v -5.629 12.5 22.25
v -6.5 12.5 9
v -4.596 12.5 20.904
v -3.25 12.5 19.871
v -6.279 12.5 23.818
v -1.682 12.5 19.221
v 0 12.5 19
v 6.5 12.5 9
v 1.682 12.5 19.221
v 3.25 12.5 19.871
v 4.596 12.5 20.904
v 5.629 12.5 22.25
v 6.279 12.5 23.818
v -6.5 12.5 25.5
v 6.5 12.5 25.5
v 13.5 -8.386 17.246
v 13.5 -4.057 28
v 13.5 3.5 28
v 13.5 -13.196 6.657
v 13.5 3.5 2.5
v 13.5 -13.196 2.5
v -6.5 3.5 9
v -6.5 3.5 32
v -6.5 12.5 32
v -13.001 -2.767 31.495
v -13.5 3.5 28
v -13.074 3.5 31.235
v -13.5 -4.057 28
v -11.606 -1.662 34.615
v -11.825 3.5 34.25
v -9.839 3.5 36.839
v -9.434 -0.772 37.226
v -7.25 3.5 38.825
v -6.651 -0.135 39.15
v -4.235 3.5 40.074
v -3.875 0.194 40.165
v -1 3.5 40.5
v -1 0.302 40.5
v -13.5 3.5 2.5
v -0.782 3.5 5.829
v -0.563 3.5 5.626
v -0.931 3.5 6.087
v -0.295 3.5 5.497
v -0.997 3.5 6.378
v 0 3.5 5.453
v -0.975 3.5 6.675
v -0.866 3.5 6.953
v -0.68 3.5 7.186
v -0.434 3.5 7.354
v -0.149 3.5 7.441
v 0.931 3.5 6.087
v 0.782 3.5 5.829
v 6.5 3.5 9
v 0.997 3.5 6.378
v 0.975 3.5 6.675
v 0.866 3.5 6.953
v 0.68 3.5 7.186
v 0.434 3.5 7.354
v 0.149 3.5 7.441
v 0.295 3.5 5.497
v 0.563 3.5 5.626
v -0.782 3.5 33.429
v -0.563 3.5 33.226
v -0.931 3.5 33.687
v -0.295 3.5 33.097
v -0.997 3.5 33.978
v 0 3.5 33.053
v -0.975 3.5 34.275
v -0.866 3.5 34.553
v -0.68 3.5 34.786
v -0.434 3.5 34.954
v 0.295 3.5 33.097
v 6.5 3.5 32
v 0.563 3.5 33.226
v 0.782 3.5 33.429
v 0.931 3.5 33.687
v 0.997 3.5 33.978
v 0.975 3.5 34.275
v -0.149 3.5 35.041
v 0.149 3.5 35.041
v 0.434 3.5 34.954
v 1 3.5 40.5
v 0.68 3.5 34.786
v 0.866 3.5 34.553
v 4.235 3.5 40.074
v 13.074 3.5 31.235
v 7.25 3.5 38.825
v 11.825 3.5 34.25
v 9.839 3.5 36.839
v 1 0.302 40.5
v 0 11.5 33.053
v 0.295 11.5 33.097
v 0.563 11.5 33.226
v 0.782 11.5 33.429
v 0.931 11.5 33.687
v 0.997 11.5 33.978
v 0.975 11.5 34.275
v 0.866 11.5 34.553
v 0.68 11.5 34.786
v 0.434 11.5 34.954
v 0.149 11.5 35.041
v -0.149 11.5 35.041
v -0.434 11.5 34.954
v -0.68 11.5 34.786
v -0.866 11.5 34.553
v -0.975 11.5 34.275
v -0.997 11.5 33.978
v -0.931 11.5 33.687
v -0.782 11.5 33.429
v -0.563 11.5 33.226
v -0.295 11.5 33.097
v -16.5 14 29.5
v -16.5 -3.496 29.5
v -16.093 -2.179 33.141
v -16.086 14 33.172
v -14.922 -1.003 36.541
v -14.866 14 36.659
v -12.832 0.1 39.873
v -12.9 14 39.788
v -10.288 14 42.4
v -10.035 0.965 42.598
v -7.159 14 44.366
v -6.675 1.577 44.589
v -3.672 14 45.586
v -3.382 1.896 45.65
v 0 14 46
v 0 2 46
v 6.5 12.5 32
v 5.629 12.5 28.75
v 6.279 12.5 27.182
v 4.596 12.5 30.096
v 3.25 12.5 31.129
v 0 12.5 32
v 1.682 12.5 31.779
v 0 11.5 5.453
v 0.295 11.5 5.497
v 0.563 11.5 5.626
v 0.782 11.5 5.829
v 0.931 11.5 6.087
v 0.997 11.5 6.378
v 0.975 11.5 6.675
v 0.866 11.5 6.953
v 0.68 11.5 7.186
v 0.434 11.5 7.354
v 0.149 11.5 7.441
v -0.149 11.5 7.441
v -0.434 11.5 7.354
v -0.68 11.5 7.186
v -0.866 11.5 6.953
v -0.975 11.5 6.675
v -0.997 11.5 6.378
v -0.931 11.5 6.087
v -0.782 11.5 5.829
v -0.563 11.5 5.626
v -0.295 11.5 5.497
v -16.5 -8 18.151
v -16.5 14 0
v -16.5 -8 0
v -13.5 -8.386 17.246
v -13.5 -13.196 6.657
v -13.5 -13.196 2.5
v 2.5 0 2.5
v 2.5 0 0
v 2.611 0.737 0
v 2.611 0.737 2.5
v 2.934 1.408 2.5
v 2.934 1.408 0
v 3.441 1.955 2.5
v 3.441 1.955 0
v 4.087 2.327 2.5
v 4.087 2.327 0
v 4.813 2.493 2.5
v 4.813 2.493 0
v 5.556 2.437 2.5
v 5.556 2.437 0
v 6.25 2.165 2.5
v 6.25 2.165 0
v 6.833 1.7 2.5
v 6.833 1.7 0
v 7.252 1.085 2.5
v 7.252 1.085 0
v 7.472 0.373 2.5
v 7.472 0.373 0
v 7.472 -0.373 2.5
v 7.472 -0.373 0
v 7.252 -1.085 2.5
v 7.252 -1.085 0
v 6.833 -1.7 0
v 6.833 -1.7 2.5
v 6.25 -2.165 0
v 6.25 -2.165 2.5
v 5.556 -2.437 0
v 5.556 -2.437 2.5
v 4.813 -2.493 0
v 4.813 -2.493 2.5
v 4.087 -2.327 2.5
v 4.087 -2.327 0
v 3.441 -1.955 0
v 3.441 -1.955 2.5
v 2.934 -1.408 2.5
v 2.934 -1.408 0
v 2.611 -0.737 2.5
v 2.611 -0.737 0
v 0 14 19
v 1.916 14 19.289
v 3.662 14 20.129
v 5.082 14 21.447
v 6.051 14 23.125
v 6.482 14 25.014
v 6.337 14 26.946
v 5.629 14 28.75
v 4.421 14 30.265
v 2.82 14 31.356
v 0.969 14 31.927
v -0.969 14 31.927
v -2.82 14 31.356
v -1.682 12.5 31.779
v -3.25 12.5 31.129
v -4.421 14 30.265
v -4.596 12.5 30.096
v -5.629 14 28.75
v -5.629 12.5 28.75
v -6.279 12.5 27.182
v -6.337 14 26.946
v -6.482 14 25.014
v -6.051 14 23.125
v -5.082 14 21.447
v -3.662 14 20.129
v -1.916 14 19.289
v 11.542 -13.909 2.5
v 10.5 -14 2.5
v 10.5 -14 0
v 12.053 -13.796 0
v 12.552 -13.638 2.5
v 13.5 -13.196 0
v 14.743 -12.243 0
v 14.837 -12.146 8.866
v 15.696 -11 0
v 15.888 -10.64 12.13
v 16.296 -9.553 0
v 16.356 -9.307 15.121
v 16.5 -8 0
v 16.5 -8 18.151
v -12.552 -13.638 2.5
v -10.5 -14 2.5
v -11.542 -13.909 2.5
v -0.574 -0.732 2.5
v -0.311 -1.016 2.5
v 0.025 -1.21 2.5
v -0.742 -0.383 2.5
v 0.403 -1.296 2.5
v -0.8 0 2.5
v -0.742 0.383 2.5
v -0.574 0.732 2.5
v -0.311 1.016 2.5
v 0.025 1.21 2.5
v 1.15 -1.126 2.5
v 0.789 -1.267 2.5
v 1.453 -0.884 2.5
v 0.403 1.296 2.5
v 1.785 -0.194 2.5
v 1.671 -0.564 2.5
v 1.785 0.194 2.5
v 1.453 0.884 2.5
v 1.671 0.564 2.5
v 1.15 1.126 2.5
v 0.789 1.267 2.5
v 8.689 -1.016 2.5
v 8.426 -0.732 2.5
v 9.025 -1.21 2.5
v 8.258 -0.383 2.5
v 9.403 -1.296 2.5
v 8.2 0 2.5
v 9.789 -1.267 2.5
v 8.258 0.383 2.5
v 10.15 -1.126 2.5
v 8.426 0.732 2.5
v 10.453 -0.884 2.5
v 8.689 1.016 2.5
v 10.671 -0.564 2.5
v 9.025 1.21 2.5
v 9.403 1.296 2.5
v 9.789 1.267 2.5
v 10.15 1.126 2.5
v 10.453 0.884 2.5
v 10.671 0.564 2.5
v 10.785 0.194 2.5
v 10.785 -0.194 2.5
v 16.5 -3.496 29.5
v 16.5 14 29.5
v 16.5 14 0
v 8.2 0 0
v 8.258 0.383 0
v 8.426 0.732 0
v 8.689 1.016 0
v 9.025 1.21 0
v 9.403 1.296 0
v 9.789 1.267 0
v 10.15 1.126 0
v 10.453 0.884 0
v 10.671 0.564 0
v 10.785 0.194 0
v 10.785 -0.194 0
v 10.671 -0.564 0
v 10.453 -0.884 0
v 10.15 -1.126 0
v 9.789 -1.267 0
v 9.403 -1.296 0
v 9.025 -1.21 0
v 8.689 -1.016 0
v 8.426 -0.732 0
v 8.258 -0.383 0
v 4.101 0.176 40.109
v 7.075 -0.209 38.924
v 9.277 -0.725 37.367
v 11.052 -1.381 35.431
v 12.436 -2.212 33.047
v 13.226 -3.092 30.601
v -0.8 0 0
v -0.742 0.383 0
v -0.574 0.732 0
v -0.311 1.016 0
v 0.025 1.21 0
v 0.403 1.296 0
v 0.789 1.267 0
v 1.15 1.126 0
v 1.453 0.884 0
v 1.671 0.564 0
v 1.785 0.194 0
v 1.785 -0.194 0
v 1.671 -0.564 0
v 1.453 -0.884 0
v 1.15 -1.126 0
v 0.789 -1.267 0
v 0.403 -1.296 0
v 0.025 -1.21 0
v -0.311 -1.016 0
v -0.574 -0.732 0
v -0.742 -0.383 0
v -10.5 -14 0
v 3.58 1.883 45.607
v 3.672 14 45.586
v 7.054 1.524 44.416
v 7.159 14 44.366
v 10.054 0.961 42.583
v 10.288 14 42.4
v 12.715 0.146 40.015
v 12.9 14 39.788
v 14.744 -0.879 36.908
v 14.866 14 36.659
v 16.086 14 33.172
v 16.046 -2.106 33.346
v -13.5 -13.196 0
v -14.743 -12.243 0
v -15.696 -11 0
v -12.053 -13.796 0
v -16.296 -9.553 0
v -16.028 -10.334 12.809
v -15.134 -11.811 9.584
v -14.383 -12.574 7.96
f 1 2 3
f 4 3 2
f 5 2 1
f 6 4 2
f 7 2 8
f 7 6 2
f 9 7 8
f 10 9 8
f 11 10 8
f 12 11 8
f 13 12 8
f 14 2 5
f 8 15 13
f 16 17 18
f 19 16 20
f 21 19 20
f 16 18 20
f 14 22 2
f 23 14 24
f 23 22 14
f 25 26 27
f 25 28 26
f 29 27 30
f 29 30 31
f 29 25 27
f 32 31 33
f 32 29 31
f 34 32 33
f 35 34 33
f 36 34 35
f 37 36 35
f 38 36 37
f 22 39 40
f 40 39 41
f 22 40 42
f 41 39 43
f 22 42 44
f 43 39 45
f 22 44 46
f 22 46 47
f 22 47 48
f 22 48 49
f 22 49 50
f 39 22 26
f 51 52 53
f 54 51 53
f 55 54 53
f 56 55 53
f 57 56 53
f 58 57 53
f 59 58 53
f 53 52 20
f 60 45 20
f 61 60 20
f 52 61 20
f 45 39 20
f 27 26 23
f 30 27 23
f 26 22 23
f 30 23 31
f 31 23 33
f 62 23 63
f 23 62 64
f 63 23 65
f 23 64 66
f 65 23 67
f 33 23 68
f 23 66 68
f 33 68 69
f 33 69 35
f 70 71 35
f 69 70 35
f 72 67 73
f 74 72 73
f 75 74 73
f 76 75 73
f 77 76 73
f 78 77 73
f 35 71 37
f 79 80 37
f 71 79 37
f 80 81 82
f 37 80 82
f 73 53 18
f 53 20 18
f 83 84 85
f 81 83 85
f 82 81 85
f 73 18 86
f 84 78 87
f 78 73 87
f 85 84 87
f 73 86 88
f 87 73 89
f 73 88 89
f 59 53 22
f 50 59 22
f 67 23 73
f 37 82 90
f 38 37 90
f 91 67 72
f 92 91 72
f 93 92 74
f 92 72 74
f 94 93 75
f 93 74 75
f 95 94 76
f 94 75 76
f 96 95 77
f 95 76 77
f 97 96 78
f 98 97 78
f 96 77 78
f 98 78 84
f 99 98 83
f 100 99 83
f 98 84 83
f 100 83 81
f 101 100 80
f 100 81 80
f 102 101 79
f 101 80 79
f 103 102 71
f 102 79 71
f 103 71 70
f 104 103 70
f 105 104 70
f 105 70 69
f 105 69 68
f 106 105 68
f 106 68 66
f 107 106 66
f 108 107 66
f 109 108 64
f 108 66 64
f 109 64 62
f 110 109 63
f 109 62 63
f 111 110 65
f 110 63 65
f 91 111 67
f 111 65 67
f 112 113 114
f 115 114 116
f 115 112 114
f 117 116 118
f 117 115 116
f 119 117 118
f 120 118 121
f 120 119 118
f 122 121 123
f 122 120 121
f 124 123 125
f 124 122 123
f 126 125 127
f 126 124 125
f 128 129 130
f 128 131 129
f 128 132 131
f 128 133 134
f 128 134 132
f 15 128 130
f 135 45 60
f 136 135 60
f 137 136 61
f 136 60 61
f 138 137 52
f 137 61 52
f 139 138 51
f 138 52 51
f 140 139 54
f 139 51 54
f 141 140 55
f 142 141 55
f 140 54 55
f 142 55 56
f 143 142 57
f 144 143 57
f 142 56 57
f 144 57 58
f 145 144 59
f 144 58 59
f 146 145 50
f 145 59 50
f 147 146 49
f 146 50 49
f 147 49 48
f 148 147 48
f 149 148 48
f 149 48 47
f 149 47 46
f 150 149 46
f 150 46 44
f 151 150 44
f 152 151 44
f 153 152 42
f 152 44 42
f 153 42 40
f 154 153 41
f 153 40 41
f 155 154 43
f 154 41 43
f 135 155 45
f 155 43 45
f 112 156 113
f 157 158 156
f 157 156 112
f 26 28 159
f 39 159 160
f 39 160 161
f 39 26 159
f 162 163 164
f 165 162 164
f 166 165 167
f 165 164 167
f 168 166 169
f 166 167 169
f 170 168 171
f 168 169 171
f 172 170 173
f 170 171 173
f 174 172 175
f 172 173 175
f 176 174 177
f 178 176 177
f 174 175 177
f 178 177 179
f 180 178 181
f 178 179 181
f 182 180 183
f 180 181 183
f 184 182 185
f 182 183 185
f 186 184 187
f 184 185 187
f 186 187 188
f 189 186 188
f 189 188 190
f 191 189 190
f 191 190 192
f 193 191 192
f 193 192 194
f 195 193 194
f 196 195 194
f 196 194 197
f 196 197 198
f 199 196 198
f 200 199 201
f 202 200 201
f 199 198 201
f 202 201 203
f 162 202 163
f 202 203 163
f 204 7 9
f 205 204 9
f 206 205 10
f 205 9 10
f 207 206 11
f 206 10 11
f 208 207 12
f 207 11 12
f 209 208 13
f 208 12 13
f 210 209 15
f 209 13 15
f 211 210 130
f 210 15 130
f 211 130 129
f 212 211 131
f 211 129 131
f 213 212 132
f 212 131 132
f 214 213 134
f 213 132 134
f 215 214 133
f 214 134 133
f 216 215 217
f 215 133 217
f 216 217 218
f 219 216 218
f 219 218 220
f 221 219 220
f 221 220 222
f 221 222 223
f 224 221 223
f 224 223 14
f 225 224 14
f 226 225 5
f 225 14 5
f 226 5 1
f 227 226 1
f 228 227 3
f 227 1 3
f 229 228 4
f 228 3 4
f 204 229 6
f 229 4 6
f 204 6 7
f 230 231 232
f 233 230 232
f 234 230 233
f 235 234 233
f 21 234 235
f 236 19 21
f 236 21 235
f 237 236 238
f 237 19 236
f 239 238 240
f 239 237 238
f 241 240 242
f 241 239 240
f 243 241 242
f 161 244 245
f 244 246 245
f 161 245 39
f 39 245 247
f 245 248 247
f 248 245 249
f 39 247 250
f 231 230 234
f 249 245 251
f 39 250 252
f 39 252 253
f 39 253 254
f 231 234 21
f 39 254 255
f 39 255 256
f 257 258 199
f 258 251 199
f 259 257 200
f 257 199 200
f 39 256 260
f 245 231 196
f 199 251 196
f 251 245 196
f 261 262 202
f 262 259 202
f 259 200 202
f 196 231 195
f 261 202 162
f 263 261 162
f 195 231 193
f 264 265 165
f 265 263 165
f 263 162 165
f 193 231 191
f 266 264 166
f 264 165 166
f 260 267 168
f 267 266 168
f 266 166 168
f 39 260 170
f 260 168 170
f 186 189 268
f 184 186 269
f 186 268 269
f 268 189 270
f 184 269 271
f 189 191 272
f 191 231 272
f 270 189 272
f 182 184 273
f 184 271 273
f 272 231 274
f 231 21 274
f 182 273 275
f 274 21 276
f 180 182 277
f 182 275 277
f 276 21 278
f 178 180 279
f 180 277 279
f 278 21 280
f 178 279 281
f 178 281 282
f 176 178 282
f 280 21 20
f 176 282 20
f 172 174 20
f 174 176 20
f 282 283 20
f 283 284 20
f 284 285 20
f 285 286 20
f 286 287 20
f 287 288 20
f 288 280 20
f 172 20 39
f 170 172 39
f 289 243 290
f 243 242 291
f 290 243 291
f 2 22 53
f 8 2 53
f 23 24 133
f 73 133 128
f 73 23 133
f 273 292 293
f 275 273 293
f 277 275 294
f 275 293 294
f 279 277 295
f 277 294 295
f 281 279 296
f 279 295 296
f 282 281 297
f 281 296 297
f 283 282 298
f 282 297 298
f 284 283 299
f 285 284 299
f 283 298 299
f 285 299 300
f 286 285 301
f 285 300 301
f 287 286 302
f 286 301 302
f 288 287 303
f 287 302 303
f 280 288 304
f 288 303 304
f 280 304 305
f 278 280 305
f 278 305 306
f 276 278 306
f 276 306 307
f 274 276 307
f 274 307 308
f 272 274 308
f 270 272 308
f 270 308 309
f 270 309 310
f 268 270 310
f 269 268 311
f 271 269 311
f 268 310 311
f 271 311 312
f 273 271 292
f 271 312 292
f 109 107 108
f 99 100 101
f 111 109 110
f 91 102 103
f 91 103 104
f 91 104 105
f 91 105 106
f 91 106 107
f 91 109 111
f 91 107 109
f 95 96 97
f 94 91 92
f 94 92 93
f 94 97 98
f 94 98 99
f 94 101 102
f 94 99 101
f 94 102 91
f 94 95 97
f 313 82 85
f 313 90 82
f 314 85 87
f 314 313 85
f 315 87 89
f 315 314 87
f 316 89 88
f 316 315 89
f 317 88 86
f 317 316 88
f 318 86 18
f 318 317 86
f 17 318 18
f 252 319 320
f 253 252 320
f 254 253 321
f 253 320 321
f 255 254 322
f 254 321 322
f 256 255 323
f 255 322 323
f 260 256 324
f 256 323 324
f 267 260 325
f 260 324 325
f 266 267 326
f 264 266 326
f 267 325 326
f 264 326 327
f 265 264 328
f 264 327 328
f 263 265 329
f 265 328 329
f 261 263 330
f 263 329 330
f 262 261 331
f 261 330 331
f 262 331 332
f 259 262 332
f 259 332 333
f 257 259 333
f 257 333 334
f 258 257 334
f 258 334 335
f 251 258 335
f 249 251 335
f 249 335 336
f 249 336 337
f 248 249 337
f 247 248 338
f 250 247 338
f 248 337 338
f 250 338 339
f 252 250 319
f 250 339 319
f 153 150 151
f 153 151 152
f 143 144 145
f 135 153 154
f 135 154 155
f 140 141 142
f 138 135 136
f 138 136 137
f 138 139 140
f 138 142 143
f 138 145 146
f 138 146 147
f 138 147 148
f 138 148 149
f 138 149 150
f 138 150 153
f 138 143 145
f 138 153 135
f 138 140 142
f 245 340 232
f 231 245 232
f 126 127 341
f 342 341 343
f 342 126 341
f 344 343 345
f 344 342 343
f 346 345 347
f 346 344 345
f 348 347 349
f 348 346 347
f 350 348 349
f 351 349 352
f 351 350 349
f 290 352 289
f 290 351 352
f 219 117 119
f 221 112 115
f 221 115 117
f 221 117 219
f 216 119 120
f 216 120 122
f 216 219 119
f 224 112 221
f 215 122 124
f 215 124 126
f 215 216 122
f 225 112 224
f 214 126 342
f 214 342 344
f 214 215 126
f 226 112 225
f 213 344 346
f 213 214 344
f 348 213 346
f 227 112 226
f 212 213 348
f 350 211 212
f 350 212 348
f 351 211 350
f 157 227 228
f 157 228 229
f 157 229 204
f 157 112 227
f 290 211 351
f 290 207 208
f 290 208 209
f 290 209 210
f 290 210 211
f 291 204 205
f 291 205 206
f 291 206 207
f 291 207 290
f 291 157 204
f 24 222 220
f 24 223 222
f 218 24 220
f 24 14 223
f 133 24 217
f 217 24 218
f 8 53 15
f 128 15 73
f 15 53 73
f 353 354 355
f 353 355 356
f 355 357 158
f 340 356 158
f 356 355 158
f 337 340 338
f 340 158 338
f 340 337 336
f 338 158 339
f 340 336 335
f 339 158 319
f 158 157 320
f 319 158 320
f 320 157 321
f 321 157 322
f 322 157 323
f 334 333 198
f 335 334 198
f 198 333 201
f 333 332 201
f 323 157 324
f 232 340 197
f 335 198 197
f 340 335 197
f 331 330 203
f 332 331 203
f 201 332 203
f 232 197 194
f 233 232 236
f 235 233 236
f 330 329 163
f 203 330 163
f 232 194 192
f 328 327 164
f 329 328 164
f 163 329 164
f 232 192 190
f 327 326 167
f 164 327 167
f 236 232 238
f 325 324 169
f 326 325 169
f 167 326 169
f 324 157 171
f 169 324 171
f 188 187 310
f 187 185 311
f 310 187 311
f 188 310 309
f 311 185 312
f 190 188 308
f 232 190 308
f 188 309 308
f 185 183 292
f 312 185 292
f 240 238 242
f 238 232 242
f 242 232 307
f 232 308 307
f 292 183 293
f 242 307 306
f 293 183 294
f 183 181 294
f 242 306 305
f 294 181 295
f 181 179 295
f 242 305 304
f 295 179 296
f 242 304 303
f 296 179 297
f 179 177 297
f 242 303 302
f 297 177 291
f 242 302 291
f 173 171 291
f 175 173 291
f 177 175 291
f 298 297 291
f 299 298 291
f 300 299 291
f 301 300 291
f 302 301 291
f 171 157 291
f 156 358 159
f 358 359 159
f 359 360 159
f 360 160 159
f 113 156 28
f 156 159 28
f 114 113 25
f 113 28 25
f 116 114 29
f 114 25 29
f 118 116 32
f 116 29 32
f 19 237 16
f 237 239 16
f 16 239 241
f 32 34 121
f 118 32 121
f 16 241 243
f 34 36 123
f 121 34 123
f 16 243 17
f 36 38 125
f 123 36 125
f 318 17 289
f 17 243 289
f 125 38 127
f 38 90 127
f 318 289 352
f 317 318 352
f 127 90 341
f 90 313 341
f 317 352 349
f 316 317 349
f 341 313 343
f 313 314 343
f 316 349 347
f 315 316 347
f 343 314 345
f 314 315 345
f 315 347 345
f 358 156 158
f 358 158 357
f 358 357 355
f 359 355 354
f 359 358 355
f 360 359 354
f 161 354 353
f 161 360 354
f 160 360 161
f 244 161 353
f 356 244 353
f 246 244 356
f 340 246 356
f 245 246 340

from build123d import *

# Parameters (mm, degrees)
SKETCH1_W           = 33
SKETCH1_H           = 28
BOSS_EXTRUDE1_DEPTH = 46
CUT_EXTRUDE1_DEPTH  = 59.318093247
CUT_EXTRUDE2_START  = -3
CUT_EXTRUDE2_DEPTH  = 27
FILLET2_R           = 12.5
FILLET3_R           = 16.5
FILLET4_R           = 6
SKETCH5_W           = 13
SKETCH5_H           = 23
CUT_EXTRUDE3_DEPTH  = 9
SKETCH6_R           = 6.5
CUT_EXTRUDE4_DEPTH  = 56.592265809
SKETCH7_R           = 1
CUT_EXTRUDE6_DEPTH  = 8
SKETCH8_R           = 1.3
SKETCH8_R_2         = 2.5
CUT_EXTRUDE7_DEPTH  = 2.5


with BuildPart() as part:
    # Sketch1 → Boss-Extrude1 (new body)
    with BuildSketch(Plane.XY):
        Rectangle(SKETCH1_W, SKETCH1_H)
    extrude(amount=BOSS_EXTRUDE1_DEPTH)

    # Sketch2 → Cut-Extrude1 (cut, through all)
    with BuildSketch(Plane(origin=(16.5, 0, 0), x_dir=(0, 0, -1), z_dir=(1, 0, 0))):
        with BuildLine():
            Line((-46, 2), (-46, -14))
            Line((-46, -14), (-5, -14))
            add(Edge.make_bspline(
                [(-5, -14), (-24.903930892, -4.26145895), (-46, 2)],
                knots=[0, 0, 0, 1, 1, 1], degree=2))
        make_face()
    extrude(amount=-CUT_EXTRUDE1_DEPTH, mode=Mode.SUBTRACT)

    # Sketch4 → Cut-Extrude2 (cut)
    with BuildSketch(Plane(origin=(16.5, 0, 0), x_dir=(0, 0, -1), z_dir=(1, 0, 0)).offset(CUT_EXTRUDE2_START)):
        with BuildLine():
            Line((-5, -14), (-2.5, -14))
            Line((-2.5, -14), (-2.5, 3.5))
            Line((-2.5, 3.5), (-40.5, 3.5))
            Line((-40.5, 3.5), (-40.5, 0.301980422))
            add(Edge.make_bspline(
                [(-5, -14), (-22.299705813, -5.535647097), (-40.5, 0.301980422)],
                knots=[0, 0, 0, 1, 1, 1], degree=2))
        make_face()
    extrude(amount=-CUT_EXTRUDE2_DEPTH, mode=Mode.SUBTRACT)

    # Fillet2
    fillet2_edges = [part.edges().sort_by_distance(p)[0] for p in [
        (-13.5, 1.900990211, 40.5),
        (13.5, 1.900990211, 40.5),
    ]]
    fillet(fillet2_edges, radius=FILLET2_R)

    # Fillet3
    fillet3_edges = [part.edges().sort_by_distance(p)[0] for p in [
        (-16.5, 8, 46),
        (16.5, 8, 46),
    ]]
    fillet(fillet3_edges, radius=FILLET3_R - 0.0001)  # a hair under: the kernel refuses the full size

    # Fillet4
    fillet4_edges = [part.edges().sort_by_distance(p)[0] for p in [
        (-16.5, -14, 2.5),
        (16.5, -14, 2.5),
    ]]
    fillet(fillet4_edges, radius=FILLET4_R)

    # Sketch5 → Cut-Extrude3 (cut)
    with BuildSketch(Plane.XZ.offset(-3.5)):
        with Locations((0, 20.5)):
            Rectangle(SKETCH5_W, SKETCH5_H)
    extrude(amount=-CUT_EXTRUDE3_DEPTH, mode=Mode.SUBTRACT)

    # Sketch6 → Cut-Extrude4 (cut, through all)
    with BuildSketch(Plane.XZ.offset(-12.5)):
        with Locations(Location((0, 25.5, 0), (0, 0, 270))):
            Circle(SKETCH6_R)
    extrude(amount=-CUT_EXTRUDE4_DEPTH, mode=Mode.SUBTRACT)

    # Sketch7 → Cut-Extrude6 (cut)
    with BuildSketch(Plane.XZ.offset(-3.5)):
        with Locations(Location((0, 34.052667497, 0), (0, 0, 270))):
            Circle(SKETCH7_R)
        with Locations(Location((0, 6.452667497, 0), (0, 0, 270))):
            Circle(SKETCH7_R)
    extrude(amount=-CUT_EXTRUDE6_DEPTH, mode=Mode.SUBTRACT)

    # Sketch8 → Cut-Extrude7 (cut)
    with BuildSketch(Plane(origin=(0, 0, 0), x_dir=(-1, 0, 0), z_dir=(0, 0, -1))):
        with Locations((-9.5, 0)):
            Circle(SKETCH8_R)
        with Locations((-5, 0)):
            Circle(SKETCH8_R_2)
        with Locations((-0.5, 0)):
            Circle(SKETCH8_R)
    extrude(amount=-CUT_EXTRUDE7_DEPTH, mode=Mode.SUBTRACT)


solid = part.part
